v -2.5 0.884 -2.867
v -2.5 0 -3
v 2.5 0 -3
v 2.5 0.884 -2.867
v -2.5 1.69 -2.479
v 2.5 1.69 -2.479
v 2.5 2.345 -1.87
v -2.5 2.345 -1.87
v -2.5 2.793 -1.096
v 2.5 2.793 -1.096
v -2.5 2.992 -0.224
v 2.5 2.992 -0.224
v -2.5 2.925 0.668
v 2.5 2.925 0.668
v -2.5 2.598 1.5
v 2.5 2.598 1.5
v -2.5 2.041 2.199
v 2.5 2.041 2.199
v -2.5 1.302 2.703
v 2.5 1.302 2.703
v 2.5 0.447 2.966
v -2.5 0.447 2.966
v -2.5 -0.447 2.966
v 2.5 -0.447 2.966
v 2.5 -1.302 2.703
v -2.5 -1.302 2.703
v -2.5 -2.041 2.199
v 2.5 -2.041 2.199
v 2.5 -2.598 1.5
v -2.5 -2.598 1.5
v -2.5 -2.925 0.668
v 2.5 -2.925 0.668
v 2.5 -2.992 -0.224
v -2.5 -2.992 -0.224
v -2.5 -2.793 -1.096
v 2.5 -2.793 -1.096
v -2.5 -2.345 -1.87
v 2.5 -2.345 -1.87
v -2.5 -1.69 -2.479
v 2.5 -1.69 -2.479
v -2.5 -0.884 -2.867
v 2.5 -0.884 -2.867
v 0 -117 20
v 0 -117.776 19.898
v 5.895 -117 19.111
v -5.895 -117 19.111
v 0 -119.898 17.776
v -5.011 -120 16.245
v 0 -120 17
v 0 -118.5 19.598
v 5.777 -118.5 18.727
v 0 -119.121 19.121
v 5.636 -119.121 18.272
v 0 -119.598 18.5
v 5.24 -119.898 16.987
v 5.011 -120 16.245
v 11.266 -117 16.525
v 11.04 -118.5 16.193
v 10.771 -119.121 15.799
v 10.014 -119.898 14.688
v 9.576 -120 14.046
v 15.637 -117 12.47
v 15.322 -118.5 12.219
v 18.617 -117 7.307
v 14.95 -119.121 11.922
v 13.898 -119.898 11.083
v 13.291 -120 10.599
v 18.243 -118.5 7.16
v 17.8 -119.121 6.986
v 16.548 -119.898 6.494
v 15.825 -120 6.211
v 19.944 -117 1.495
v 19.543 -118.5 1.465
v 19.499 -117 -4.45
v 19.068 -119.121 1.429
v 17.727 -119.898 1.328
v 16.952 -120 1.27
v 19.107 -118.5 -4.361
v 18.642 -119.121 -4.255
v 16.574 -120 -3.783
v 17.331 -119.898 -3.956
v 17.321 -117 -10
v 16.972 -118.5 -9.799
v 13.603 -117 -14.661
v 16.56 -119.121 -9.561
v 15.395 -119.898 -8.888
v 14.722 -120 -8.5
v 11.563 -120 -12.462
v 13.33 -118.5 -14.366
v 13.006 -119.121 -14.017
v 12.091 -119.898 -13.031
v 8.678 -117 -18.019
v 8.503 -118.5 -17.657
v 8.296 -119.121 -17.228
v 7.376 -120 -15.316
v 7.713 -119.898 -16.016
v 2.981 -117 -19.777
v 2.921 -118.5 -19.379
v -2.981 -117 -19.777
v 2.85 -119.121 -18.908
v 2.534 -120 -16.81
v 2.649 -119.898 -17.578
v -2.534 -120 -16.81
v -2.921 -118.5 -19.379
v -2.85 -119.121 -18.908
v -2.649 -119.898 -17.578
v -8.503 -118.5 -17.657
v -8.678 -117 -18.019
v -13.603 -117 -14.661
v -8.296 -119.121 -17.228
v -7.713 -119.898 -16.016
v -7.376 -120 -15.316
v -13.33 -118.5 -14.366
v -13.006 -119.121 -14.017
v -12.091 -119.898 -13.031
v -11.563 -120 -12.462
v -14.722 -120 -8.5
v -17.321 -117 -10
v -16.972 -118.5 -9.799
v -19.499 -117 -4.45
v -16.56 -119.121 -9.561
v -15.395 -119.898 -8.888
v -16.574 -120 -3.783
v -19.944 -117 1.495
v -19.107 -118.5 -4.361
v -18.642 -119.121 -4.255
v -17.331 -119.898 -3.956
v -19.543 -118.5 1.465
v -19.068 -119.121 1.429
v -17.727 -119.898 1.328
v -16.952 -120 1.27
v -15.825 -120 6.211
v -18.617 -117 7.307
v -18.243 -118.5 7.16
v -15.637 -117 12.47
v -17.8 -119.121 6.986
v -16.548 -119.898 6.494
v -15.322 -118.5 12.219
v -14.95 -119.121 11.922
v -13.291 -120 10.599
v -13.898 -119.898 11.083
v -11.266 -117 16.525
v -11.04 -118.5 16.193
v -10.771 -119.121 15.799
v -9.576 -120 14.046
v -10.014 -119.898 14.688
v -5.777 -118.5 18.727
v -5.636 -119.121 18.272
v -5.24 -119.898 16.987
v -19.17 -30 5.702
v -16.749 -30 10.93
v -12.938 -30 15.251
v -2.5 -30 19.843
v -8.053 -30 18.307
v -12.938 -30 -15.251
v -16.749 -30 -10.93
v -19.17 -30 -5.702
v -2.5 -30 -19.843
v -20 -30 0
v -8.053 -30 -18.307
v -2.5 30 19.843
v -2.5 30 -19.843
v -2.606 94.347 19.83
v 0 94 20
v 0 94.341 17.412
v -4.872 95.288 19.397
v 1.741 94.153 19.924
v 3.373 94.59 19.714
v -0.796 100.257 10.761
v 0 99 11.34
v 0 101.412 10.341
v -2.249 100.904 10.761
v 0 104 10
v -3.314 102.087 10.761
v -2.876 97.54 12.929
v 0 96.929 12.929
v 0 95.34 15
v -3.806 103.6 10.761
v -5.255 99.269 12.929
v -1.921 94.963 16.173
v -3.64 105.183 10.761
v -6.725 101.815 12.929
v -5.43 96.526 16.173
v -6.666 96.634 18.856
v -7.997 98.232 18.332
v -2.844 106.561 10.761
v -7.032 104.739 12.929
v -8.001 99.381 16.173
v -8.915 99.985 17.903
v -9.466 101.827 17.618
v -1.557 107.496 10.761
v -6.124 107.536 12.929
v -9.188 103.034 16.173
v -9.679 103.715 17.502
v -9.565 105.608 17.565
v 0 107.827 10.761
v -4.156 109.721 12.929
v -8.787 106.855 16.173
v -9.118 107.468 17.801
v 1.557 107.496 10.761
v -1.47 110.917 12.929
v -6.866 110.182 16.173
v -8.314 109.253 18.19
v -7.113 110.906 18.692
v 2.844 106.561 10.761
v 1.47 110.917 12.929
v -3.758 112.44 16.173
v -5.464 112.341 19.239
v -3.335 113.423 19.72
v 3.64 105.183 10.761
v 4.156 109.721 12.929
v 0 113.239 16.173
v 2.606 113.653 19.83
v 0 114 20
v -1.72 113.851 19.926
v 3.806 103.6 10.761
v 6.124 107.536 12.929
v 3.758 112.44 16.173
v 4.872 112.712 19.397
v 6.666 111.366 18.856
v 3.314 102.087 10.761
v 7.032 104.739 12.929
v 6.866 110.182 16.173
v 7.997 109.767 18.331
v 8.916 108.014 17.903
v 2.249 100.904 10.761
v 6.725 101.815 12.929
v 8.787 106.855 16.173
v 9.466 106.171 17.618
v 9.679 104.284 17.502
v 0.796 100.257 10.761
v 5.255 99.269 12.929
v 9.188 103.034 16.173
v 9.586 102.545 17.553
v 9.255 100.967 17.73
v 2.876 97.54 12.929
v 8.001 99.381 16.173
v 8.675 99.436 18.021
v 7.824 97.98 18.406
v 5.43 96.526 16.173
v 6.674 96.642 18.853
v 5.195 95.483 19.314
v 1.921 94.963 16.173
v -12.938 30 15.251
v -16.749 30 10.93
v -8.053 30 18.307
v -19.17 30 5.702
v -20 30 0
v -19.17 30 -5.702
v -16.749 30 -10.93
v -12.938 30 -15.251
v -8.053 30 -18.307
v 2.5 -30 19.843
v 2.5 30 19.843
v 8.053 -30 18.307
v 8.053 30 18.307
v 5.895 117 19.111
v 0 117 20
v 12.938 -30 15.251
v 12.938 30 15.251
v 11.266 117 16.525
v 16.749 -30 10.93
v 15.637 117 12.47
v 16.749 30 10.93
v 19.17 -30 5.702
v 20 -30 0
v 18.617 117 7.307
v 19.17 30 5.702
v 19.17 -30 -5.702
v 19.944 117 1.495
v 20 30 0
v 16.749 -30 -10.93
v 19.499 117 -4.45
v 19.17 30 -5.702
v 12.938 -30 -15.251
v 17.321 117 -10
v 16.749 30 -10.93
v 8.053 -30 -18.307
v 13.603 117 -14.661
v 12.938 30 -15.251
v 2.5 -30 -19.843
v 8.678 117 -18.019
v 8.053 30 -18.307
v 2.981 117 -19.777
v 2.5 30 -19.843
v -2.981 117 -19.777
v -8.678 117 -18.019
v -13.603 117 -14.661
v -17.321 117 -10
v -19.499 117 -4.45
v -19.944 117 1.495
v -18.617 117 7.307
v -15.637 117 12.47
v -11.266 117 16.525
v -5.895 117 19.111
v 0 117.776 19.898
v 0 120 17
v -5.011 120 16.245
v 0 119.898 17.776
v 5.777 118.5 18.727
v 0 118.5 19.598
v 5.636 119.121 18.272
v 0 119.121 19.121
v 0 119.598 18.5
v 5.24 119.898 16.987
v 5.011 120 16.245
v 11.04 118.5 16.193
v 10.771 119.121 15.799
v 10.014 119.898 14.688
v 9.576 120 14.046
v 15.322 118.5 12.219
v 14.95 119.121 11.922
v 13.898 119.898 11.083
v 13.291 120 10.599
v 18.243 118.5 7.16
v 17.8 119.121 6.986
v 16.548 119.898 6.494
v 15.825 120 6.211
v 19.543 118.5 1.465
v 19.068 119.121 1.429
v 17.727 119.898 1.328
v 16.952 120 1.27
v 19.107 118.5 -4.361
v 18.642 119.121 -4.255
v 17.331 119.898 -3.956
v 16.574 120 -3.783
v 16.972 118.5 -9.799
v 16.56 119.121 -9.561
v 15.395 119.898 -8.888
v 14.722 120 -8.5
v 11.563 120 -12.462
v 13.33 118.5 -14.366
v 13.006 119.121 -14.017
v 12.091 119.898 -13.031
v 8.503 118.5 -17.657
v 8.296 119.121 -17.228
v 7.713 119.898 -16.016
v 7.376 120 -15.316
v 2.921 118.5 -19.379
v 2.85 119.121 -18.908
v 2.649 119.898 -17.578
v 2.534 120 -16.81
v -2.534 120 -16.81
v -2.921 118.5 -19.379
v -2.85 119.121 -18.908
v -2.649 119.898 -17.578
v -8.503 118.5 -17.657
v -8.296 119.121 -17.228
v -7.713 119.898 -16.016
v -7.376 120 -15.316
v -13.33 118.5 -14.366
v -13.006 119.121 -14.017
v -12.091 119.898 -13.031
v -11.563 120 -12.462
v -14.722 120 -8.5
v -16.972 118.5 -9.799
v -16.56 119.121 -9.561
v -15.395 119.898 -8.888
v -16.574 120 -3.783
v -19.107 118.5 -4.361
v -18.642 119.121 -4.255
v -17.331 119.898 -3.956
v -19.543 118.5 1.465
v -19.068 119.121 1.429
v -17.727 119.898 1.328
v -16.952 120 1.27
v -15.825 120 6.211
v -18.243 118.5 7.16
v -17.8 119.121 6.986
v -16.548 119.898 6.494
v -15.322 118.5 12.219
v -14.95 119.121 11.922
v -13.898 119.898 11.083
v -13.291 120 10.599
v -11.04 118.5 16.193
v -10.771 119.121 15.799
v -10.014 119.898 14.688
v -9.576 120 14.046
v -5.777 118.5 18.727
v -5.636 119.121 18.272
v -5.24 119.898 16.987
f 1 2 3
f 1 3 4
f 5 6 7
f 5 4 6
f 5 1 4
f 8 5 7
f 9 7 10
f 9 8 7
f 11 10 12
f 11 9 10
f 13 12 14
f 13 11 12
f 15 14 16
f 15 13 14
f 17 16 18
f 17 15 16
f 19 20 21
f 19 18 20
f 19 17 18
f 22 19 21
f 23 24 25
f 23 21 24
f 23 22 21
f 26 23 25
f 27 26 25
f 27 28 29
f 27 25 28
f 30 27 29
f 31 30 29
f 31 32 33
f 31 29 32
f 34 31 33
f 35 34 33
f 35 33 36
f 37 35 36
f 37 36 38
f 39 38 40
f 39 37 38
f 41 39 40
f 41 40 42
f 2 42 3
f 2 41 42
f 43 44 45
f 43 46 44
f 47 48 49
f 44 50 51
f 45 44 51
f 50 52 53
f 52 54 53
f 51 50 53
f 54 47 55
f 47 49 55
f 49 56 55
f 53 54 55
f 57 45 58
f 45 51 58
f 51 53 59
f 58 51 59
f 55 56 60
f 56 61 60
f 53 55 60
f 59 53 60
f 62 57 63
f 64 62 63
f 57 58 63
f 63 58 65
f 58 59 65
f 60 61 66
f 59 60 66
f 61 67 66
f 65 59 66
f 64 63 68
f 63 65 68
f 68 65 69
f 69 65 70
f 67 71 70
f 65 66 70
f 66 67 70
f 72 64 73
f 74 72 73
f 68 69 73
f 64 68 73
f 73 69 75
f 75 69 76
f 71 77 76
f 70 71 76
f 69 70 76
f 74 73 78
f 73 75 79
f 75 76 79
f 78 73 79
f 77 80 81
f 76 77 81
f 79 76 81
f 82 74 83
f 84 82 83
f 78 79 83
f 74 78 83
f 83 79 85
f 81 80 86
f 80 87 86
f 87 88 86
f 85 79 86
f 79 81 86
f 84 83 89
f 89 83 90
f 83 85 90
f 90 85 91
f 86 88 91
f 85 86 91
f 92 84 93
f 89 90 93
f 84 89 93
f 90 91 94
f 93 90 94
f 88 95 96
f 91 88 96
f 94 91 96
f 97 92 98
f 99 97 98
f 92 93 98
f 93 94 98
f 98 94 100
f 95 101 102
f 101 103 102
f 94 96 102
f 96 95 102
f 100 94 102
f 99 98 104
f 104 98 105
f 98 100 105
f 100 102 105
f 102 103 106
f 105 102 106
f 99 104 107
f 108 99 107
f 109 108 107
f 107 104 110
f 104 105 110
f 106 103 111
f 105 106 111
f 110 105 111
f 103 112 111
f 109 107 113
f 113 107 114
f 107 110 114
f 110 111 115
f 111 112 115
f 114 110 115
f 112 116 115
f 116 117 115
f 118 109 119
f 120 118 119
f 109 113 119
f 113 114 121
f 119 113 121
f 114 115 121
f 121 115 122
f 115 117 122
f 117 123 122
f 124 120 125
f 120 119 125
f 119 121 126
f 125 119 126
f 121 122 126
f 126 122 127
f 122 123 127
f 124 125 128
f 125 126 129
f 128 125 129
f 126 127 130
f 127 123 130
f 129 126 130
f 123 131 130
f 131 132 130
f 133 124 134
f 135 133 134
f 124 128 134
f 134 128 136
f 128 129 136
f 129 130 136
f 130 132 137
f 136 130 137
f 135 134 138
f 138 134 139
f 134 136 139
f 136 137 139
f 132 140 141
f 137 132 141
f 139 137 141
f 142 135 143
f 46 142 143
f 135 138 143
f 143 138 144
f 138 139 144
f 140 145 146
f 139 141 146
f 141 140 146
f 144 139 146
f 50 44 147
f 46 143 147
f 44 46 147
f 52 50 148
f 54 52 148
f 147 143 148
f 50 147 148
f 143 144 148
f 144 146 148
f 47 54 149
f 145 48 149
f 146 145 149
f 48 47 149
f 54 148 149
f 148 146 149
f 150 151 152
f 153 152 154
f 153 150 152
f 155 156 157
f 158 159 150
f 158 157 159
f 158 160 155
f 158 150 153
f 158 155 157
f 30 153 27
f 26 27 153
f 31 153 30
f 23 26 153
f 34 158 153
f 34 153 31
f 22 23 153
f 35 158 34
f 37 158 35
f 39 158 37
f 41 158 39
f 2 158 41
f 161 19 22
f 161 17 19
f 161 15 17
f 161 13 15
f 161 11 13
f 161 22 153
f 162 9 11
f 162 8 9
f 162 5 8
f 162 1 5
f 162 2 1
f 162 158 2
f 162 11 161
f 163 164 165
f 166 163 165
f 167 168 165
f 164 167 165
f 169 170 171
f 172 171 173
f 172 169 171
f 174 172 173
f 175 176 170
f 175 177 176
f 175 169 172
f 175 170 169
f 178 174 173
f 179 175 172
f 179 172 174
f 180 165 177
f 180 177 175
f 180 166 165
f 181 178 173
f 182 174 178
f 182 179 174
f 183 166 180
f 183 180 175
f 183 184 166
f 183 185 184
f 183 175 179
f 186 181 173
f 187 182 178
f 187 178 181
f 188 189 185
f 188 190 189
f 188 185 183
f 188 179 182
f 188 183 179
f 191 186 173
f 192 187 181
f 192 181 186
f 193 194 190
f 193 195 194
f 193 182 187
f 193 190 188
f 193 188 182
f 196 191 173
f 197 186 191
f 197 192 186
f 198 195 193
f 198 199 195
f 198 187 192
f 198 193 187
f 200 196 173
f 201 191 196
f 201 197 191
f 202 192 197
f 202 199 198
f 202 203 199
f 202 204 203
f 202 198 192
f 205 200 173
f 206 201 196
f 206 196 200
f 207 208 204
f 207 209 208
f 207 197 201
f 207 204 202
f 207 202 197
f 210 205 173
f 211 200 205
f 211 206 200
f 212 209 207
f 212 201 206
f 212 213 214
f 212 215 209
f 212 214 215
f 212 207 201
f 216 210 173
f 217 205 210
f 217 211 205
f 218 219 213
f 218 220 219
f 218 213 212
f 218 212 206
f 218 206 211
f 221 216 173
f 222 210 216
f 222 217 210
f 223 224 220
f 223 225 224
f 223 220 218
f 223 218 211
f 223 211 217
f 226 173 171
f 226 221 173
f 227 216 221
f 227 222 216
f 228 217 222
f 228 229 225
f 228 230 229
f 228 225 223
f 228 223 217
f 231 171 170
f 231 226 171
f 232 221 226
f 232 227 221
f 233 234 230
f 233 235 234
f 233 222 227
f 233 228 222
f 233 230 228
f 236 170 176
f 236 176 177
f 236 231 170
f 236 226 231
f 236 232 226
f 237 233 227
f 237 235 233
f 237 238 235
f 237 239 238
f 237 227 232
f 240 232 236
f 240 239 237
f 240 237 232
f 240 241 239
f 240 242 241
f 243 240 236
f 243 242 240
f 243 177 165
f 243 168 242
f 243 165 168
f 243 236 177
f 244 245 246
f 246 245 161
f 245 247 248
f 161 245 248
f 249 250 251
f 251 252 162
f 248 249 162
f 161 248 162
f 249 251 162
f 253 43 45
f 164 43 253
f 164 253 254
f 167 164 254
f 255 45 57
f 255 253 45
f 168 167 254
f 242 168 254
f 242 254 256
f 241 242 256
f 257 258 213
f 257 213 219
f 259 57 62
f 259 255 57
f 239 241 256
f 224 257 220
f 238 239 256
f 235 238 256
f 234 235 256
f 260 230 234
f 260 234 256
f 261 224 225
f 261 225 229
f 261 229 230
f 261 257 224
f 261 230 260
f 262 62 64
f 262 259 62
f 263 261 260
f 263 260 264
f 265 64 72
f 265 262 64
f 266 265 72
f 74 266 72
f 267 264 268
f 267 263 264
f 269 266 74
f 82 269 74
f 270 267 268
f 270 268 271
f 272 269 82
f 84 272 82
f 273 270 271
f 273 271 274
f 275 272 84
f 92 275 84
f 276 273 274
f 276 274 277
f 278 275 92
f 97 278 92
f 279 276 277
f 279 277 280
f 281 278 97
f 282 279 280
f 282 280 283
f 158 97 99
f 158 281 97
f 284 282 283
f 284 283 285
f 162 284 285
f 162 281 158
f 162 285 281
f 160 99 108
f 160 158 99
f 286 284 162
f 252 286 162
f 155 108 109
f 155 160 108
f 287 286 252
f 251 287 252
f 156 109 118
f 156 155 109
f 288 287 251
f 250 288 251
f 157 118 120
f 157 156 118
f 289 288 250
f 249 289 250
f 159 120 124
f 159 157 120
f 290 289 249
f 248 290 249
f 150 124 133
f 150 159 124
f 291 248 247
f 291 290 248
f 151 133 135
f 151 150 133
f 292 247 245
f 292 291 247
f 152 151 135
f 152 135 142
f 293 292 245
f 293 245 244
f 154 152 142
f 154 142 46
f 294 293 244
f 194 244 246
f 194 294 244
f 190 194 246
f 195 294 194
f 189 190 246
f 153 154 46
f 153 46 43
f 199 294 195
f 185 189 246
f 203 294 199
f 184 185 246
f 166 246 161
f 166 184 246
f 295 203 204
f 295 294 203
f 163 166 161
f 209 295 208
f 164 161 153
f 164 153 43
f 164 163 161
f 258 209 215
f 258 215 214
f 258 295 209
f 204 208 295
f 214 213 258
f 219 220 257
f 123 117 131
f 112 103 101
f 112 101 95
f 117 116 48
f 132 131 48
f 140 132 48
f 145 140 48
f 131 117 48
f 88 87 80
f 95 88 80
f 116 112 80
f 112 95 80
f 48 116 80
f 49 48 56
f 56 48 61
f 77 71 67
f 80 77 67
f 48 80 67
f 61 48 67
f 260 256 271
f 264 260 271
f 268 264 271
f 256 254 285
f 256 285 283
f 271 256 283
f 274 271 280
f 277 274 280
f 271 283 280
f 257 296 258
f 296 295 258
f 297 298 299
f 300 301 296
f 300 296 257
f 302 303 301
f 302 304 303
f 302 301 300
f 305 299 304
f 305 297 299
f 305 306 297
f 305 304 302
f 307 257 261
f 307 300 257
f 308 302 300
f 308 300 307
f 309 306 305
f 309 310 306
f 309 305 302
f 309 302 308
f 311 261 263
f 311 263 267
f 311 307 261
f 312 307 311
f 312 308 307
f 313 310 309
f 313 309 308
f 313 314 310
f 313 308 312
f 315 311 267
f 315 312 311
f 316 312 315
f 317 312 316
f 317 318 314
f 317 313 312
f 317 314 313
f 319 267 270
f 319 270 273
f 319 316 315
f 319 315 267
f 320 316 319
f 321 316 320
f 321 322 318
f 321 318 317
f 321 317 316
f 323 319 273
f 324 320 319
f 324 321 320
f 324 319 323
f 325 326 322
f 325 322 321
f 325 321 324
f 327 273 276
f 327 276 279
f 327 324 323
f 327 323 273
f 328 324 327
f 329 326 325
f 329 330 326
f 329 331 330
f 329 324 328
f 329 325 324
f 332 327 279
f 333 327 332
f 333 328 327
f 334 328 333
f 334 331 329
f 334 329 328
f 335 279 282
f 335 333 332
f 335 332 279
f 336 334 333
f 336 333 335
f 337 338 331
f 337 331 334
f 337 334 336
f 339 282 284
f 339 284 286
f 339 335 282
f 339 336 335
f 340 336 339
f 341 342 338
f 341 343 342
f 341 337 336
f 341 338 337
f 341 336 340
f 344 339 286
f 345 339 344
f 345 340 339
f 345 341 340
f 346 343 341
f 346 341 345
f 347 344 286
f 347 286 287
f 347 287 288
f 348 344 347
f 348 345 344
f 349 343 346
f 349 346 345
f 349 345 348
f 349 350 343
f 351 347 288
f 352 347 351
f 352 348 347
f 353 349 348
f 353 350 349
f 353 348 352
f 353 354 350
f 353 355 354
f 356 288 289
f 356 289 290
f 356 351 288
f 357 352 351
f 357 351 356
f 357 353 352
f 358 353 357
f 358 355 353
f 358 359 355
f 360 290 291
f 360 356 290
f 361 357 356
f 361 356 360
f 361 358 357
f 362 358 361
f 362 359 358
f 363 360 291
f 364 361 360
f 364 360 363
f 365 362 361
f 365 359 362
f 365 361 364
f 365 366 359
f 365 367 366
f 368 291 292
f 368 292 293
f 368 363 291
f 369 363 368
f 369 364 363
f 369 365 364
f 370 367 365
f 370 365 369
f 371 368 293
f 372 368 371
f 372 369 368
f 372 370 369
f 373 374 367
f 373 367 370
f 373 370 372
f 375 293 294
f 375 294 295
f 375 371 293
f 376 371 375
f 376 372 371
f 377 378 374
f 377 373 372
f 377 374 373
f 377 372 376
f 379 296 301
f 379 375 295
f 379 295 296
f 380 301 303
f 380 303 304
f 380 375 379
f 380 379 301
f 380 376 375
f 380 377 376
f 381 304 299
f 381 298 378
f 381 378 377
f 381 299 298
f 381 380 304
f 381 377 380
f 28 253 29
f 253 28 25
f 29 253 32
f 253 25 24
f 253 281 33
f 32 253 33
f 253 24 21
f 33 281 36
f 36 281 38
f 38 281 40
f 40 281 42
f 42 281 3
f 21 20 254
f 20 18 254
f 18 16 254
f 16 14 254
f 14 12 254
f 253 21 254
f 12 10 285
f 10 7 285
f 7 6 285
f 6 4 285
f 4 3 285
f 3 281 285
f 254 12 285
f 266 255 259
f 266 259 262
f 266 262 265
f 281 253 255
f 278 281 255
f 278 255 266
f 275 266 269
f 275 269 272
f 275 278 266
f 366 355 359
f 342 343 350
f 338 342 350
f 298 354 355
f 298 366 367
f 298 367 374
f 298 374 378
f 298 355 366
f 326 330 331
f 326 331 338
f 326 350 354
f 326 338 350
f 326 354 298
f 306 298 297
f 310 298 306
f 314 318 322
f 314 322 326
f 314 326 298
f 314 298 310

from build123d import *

# Parameters (mm, degrees)
SKETCH1_R               = 20
BOSS_EXTRUDE1_DEPTH     = 120
CUT_EXTRUDE5_DEPTH      = 124.288280059
CUT_EXTRUDE5_DEPTH_BACK = 124.288280059
SKETCH2_W               = 17.5
SKETCH2_H               = 60
SKETCH2_W_2             = 24.890093951
CUT_EXTRUDE7_DEPTH      = 124.718430317
CUT_EXTRUDE7_DEPTH_BACK = 124.718430317
SKETCH6_R               = 3
FILLET1_R               = 3


with BuildPart() as part:
    # Sketch1 → Boss-Extrude1 (new, symmetric)
    with BuildSketch(Plane(origin=(0, 0, 0), x_dir=(1, 0, 0), z_dir=(0, 1, 0))):
        with Locations(Location((0, 0, 0), (0, 0, 270))):
            Circle(SKETCH1_R)
    extrude(amount=BOSS_EXTRUDE1_DEPTH, both=True)

    # Sketch2 → Cut-Extrude5 (cut, two sides: drawn at the far end of the back side and taken through both)
    with BuildSketch(Plane.XY.offset(-CUT_EXTRUDE5_DEPTH_BACK)):
        with Locations((-11.25, 0)):
            Rectangle(SKETCH2_W, SKETCH2_H)
        with Locations((14.945046976, 0)):
            Rectangle(SKETCH2_W_2, SKETCH2_H)
    extrude(amount=CUT_EXTRUDE5_DEPTH + CUT_EXTRUDE5_DEPTH_BACK, mode=Mode.SUBTRACT)

    # Sketch6 → Cut-Extrude7 (cut, two sides: drawn at the far end of the back side and taken through both)
    with BuildSketch(Plane(origin=(2.5, 0, 0), x_dir=(0, 0, -1), z_dir=(1, 0, 0)).offset(-CUT_EXTRUDE7_DEPTH_BACK)):
        Circle(SKETCH6_R)
    extrude(amount=CUT_EXTRUDE7_DEPTH + CUT_EXTRUDE7_DEPTH_BACK, mode=Mode.SUBTRACT)

    # Sketch7 → Cut-Revolve1 (revolve, cut)
    with BuildSketch(Plane(origin=(0, 0, 0), x_dir=(0, 0, -1), z_dir=(1, 0, 0))):
        with BuildLine():
            Line((-30, 104), (-10, 104))
            ThreePointArc((-10, 104), (-20, 94), (-30, 104))
        make_face()
    revolve(axis=Axis((0, 104, 30), (0, 0, -1)), mode=Mode.SUBTRACT)

    # Fillet1
    fillet1_edges = [part.edges().sort_by_distance(p)[0] for p in [
        (0, -120, -20),
        (0, 120, -20),
    ]]
    fillet(fillet1_edges, radius=FILLET1_R)


solid = part.part
